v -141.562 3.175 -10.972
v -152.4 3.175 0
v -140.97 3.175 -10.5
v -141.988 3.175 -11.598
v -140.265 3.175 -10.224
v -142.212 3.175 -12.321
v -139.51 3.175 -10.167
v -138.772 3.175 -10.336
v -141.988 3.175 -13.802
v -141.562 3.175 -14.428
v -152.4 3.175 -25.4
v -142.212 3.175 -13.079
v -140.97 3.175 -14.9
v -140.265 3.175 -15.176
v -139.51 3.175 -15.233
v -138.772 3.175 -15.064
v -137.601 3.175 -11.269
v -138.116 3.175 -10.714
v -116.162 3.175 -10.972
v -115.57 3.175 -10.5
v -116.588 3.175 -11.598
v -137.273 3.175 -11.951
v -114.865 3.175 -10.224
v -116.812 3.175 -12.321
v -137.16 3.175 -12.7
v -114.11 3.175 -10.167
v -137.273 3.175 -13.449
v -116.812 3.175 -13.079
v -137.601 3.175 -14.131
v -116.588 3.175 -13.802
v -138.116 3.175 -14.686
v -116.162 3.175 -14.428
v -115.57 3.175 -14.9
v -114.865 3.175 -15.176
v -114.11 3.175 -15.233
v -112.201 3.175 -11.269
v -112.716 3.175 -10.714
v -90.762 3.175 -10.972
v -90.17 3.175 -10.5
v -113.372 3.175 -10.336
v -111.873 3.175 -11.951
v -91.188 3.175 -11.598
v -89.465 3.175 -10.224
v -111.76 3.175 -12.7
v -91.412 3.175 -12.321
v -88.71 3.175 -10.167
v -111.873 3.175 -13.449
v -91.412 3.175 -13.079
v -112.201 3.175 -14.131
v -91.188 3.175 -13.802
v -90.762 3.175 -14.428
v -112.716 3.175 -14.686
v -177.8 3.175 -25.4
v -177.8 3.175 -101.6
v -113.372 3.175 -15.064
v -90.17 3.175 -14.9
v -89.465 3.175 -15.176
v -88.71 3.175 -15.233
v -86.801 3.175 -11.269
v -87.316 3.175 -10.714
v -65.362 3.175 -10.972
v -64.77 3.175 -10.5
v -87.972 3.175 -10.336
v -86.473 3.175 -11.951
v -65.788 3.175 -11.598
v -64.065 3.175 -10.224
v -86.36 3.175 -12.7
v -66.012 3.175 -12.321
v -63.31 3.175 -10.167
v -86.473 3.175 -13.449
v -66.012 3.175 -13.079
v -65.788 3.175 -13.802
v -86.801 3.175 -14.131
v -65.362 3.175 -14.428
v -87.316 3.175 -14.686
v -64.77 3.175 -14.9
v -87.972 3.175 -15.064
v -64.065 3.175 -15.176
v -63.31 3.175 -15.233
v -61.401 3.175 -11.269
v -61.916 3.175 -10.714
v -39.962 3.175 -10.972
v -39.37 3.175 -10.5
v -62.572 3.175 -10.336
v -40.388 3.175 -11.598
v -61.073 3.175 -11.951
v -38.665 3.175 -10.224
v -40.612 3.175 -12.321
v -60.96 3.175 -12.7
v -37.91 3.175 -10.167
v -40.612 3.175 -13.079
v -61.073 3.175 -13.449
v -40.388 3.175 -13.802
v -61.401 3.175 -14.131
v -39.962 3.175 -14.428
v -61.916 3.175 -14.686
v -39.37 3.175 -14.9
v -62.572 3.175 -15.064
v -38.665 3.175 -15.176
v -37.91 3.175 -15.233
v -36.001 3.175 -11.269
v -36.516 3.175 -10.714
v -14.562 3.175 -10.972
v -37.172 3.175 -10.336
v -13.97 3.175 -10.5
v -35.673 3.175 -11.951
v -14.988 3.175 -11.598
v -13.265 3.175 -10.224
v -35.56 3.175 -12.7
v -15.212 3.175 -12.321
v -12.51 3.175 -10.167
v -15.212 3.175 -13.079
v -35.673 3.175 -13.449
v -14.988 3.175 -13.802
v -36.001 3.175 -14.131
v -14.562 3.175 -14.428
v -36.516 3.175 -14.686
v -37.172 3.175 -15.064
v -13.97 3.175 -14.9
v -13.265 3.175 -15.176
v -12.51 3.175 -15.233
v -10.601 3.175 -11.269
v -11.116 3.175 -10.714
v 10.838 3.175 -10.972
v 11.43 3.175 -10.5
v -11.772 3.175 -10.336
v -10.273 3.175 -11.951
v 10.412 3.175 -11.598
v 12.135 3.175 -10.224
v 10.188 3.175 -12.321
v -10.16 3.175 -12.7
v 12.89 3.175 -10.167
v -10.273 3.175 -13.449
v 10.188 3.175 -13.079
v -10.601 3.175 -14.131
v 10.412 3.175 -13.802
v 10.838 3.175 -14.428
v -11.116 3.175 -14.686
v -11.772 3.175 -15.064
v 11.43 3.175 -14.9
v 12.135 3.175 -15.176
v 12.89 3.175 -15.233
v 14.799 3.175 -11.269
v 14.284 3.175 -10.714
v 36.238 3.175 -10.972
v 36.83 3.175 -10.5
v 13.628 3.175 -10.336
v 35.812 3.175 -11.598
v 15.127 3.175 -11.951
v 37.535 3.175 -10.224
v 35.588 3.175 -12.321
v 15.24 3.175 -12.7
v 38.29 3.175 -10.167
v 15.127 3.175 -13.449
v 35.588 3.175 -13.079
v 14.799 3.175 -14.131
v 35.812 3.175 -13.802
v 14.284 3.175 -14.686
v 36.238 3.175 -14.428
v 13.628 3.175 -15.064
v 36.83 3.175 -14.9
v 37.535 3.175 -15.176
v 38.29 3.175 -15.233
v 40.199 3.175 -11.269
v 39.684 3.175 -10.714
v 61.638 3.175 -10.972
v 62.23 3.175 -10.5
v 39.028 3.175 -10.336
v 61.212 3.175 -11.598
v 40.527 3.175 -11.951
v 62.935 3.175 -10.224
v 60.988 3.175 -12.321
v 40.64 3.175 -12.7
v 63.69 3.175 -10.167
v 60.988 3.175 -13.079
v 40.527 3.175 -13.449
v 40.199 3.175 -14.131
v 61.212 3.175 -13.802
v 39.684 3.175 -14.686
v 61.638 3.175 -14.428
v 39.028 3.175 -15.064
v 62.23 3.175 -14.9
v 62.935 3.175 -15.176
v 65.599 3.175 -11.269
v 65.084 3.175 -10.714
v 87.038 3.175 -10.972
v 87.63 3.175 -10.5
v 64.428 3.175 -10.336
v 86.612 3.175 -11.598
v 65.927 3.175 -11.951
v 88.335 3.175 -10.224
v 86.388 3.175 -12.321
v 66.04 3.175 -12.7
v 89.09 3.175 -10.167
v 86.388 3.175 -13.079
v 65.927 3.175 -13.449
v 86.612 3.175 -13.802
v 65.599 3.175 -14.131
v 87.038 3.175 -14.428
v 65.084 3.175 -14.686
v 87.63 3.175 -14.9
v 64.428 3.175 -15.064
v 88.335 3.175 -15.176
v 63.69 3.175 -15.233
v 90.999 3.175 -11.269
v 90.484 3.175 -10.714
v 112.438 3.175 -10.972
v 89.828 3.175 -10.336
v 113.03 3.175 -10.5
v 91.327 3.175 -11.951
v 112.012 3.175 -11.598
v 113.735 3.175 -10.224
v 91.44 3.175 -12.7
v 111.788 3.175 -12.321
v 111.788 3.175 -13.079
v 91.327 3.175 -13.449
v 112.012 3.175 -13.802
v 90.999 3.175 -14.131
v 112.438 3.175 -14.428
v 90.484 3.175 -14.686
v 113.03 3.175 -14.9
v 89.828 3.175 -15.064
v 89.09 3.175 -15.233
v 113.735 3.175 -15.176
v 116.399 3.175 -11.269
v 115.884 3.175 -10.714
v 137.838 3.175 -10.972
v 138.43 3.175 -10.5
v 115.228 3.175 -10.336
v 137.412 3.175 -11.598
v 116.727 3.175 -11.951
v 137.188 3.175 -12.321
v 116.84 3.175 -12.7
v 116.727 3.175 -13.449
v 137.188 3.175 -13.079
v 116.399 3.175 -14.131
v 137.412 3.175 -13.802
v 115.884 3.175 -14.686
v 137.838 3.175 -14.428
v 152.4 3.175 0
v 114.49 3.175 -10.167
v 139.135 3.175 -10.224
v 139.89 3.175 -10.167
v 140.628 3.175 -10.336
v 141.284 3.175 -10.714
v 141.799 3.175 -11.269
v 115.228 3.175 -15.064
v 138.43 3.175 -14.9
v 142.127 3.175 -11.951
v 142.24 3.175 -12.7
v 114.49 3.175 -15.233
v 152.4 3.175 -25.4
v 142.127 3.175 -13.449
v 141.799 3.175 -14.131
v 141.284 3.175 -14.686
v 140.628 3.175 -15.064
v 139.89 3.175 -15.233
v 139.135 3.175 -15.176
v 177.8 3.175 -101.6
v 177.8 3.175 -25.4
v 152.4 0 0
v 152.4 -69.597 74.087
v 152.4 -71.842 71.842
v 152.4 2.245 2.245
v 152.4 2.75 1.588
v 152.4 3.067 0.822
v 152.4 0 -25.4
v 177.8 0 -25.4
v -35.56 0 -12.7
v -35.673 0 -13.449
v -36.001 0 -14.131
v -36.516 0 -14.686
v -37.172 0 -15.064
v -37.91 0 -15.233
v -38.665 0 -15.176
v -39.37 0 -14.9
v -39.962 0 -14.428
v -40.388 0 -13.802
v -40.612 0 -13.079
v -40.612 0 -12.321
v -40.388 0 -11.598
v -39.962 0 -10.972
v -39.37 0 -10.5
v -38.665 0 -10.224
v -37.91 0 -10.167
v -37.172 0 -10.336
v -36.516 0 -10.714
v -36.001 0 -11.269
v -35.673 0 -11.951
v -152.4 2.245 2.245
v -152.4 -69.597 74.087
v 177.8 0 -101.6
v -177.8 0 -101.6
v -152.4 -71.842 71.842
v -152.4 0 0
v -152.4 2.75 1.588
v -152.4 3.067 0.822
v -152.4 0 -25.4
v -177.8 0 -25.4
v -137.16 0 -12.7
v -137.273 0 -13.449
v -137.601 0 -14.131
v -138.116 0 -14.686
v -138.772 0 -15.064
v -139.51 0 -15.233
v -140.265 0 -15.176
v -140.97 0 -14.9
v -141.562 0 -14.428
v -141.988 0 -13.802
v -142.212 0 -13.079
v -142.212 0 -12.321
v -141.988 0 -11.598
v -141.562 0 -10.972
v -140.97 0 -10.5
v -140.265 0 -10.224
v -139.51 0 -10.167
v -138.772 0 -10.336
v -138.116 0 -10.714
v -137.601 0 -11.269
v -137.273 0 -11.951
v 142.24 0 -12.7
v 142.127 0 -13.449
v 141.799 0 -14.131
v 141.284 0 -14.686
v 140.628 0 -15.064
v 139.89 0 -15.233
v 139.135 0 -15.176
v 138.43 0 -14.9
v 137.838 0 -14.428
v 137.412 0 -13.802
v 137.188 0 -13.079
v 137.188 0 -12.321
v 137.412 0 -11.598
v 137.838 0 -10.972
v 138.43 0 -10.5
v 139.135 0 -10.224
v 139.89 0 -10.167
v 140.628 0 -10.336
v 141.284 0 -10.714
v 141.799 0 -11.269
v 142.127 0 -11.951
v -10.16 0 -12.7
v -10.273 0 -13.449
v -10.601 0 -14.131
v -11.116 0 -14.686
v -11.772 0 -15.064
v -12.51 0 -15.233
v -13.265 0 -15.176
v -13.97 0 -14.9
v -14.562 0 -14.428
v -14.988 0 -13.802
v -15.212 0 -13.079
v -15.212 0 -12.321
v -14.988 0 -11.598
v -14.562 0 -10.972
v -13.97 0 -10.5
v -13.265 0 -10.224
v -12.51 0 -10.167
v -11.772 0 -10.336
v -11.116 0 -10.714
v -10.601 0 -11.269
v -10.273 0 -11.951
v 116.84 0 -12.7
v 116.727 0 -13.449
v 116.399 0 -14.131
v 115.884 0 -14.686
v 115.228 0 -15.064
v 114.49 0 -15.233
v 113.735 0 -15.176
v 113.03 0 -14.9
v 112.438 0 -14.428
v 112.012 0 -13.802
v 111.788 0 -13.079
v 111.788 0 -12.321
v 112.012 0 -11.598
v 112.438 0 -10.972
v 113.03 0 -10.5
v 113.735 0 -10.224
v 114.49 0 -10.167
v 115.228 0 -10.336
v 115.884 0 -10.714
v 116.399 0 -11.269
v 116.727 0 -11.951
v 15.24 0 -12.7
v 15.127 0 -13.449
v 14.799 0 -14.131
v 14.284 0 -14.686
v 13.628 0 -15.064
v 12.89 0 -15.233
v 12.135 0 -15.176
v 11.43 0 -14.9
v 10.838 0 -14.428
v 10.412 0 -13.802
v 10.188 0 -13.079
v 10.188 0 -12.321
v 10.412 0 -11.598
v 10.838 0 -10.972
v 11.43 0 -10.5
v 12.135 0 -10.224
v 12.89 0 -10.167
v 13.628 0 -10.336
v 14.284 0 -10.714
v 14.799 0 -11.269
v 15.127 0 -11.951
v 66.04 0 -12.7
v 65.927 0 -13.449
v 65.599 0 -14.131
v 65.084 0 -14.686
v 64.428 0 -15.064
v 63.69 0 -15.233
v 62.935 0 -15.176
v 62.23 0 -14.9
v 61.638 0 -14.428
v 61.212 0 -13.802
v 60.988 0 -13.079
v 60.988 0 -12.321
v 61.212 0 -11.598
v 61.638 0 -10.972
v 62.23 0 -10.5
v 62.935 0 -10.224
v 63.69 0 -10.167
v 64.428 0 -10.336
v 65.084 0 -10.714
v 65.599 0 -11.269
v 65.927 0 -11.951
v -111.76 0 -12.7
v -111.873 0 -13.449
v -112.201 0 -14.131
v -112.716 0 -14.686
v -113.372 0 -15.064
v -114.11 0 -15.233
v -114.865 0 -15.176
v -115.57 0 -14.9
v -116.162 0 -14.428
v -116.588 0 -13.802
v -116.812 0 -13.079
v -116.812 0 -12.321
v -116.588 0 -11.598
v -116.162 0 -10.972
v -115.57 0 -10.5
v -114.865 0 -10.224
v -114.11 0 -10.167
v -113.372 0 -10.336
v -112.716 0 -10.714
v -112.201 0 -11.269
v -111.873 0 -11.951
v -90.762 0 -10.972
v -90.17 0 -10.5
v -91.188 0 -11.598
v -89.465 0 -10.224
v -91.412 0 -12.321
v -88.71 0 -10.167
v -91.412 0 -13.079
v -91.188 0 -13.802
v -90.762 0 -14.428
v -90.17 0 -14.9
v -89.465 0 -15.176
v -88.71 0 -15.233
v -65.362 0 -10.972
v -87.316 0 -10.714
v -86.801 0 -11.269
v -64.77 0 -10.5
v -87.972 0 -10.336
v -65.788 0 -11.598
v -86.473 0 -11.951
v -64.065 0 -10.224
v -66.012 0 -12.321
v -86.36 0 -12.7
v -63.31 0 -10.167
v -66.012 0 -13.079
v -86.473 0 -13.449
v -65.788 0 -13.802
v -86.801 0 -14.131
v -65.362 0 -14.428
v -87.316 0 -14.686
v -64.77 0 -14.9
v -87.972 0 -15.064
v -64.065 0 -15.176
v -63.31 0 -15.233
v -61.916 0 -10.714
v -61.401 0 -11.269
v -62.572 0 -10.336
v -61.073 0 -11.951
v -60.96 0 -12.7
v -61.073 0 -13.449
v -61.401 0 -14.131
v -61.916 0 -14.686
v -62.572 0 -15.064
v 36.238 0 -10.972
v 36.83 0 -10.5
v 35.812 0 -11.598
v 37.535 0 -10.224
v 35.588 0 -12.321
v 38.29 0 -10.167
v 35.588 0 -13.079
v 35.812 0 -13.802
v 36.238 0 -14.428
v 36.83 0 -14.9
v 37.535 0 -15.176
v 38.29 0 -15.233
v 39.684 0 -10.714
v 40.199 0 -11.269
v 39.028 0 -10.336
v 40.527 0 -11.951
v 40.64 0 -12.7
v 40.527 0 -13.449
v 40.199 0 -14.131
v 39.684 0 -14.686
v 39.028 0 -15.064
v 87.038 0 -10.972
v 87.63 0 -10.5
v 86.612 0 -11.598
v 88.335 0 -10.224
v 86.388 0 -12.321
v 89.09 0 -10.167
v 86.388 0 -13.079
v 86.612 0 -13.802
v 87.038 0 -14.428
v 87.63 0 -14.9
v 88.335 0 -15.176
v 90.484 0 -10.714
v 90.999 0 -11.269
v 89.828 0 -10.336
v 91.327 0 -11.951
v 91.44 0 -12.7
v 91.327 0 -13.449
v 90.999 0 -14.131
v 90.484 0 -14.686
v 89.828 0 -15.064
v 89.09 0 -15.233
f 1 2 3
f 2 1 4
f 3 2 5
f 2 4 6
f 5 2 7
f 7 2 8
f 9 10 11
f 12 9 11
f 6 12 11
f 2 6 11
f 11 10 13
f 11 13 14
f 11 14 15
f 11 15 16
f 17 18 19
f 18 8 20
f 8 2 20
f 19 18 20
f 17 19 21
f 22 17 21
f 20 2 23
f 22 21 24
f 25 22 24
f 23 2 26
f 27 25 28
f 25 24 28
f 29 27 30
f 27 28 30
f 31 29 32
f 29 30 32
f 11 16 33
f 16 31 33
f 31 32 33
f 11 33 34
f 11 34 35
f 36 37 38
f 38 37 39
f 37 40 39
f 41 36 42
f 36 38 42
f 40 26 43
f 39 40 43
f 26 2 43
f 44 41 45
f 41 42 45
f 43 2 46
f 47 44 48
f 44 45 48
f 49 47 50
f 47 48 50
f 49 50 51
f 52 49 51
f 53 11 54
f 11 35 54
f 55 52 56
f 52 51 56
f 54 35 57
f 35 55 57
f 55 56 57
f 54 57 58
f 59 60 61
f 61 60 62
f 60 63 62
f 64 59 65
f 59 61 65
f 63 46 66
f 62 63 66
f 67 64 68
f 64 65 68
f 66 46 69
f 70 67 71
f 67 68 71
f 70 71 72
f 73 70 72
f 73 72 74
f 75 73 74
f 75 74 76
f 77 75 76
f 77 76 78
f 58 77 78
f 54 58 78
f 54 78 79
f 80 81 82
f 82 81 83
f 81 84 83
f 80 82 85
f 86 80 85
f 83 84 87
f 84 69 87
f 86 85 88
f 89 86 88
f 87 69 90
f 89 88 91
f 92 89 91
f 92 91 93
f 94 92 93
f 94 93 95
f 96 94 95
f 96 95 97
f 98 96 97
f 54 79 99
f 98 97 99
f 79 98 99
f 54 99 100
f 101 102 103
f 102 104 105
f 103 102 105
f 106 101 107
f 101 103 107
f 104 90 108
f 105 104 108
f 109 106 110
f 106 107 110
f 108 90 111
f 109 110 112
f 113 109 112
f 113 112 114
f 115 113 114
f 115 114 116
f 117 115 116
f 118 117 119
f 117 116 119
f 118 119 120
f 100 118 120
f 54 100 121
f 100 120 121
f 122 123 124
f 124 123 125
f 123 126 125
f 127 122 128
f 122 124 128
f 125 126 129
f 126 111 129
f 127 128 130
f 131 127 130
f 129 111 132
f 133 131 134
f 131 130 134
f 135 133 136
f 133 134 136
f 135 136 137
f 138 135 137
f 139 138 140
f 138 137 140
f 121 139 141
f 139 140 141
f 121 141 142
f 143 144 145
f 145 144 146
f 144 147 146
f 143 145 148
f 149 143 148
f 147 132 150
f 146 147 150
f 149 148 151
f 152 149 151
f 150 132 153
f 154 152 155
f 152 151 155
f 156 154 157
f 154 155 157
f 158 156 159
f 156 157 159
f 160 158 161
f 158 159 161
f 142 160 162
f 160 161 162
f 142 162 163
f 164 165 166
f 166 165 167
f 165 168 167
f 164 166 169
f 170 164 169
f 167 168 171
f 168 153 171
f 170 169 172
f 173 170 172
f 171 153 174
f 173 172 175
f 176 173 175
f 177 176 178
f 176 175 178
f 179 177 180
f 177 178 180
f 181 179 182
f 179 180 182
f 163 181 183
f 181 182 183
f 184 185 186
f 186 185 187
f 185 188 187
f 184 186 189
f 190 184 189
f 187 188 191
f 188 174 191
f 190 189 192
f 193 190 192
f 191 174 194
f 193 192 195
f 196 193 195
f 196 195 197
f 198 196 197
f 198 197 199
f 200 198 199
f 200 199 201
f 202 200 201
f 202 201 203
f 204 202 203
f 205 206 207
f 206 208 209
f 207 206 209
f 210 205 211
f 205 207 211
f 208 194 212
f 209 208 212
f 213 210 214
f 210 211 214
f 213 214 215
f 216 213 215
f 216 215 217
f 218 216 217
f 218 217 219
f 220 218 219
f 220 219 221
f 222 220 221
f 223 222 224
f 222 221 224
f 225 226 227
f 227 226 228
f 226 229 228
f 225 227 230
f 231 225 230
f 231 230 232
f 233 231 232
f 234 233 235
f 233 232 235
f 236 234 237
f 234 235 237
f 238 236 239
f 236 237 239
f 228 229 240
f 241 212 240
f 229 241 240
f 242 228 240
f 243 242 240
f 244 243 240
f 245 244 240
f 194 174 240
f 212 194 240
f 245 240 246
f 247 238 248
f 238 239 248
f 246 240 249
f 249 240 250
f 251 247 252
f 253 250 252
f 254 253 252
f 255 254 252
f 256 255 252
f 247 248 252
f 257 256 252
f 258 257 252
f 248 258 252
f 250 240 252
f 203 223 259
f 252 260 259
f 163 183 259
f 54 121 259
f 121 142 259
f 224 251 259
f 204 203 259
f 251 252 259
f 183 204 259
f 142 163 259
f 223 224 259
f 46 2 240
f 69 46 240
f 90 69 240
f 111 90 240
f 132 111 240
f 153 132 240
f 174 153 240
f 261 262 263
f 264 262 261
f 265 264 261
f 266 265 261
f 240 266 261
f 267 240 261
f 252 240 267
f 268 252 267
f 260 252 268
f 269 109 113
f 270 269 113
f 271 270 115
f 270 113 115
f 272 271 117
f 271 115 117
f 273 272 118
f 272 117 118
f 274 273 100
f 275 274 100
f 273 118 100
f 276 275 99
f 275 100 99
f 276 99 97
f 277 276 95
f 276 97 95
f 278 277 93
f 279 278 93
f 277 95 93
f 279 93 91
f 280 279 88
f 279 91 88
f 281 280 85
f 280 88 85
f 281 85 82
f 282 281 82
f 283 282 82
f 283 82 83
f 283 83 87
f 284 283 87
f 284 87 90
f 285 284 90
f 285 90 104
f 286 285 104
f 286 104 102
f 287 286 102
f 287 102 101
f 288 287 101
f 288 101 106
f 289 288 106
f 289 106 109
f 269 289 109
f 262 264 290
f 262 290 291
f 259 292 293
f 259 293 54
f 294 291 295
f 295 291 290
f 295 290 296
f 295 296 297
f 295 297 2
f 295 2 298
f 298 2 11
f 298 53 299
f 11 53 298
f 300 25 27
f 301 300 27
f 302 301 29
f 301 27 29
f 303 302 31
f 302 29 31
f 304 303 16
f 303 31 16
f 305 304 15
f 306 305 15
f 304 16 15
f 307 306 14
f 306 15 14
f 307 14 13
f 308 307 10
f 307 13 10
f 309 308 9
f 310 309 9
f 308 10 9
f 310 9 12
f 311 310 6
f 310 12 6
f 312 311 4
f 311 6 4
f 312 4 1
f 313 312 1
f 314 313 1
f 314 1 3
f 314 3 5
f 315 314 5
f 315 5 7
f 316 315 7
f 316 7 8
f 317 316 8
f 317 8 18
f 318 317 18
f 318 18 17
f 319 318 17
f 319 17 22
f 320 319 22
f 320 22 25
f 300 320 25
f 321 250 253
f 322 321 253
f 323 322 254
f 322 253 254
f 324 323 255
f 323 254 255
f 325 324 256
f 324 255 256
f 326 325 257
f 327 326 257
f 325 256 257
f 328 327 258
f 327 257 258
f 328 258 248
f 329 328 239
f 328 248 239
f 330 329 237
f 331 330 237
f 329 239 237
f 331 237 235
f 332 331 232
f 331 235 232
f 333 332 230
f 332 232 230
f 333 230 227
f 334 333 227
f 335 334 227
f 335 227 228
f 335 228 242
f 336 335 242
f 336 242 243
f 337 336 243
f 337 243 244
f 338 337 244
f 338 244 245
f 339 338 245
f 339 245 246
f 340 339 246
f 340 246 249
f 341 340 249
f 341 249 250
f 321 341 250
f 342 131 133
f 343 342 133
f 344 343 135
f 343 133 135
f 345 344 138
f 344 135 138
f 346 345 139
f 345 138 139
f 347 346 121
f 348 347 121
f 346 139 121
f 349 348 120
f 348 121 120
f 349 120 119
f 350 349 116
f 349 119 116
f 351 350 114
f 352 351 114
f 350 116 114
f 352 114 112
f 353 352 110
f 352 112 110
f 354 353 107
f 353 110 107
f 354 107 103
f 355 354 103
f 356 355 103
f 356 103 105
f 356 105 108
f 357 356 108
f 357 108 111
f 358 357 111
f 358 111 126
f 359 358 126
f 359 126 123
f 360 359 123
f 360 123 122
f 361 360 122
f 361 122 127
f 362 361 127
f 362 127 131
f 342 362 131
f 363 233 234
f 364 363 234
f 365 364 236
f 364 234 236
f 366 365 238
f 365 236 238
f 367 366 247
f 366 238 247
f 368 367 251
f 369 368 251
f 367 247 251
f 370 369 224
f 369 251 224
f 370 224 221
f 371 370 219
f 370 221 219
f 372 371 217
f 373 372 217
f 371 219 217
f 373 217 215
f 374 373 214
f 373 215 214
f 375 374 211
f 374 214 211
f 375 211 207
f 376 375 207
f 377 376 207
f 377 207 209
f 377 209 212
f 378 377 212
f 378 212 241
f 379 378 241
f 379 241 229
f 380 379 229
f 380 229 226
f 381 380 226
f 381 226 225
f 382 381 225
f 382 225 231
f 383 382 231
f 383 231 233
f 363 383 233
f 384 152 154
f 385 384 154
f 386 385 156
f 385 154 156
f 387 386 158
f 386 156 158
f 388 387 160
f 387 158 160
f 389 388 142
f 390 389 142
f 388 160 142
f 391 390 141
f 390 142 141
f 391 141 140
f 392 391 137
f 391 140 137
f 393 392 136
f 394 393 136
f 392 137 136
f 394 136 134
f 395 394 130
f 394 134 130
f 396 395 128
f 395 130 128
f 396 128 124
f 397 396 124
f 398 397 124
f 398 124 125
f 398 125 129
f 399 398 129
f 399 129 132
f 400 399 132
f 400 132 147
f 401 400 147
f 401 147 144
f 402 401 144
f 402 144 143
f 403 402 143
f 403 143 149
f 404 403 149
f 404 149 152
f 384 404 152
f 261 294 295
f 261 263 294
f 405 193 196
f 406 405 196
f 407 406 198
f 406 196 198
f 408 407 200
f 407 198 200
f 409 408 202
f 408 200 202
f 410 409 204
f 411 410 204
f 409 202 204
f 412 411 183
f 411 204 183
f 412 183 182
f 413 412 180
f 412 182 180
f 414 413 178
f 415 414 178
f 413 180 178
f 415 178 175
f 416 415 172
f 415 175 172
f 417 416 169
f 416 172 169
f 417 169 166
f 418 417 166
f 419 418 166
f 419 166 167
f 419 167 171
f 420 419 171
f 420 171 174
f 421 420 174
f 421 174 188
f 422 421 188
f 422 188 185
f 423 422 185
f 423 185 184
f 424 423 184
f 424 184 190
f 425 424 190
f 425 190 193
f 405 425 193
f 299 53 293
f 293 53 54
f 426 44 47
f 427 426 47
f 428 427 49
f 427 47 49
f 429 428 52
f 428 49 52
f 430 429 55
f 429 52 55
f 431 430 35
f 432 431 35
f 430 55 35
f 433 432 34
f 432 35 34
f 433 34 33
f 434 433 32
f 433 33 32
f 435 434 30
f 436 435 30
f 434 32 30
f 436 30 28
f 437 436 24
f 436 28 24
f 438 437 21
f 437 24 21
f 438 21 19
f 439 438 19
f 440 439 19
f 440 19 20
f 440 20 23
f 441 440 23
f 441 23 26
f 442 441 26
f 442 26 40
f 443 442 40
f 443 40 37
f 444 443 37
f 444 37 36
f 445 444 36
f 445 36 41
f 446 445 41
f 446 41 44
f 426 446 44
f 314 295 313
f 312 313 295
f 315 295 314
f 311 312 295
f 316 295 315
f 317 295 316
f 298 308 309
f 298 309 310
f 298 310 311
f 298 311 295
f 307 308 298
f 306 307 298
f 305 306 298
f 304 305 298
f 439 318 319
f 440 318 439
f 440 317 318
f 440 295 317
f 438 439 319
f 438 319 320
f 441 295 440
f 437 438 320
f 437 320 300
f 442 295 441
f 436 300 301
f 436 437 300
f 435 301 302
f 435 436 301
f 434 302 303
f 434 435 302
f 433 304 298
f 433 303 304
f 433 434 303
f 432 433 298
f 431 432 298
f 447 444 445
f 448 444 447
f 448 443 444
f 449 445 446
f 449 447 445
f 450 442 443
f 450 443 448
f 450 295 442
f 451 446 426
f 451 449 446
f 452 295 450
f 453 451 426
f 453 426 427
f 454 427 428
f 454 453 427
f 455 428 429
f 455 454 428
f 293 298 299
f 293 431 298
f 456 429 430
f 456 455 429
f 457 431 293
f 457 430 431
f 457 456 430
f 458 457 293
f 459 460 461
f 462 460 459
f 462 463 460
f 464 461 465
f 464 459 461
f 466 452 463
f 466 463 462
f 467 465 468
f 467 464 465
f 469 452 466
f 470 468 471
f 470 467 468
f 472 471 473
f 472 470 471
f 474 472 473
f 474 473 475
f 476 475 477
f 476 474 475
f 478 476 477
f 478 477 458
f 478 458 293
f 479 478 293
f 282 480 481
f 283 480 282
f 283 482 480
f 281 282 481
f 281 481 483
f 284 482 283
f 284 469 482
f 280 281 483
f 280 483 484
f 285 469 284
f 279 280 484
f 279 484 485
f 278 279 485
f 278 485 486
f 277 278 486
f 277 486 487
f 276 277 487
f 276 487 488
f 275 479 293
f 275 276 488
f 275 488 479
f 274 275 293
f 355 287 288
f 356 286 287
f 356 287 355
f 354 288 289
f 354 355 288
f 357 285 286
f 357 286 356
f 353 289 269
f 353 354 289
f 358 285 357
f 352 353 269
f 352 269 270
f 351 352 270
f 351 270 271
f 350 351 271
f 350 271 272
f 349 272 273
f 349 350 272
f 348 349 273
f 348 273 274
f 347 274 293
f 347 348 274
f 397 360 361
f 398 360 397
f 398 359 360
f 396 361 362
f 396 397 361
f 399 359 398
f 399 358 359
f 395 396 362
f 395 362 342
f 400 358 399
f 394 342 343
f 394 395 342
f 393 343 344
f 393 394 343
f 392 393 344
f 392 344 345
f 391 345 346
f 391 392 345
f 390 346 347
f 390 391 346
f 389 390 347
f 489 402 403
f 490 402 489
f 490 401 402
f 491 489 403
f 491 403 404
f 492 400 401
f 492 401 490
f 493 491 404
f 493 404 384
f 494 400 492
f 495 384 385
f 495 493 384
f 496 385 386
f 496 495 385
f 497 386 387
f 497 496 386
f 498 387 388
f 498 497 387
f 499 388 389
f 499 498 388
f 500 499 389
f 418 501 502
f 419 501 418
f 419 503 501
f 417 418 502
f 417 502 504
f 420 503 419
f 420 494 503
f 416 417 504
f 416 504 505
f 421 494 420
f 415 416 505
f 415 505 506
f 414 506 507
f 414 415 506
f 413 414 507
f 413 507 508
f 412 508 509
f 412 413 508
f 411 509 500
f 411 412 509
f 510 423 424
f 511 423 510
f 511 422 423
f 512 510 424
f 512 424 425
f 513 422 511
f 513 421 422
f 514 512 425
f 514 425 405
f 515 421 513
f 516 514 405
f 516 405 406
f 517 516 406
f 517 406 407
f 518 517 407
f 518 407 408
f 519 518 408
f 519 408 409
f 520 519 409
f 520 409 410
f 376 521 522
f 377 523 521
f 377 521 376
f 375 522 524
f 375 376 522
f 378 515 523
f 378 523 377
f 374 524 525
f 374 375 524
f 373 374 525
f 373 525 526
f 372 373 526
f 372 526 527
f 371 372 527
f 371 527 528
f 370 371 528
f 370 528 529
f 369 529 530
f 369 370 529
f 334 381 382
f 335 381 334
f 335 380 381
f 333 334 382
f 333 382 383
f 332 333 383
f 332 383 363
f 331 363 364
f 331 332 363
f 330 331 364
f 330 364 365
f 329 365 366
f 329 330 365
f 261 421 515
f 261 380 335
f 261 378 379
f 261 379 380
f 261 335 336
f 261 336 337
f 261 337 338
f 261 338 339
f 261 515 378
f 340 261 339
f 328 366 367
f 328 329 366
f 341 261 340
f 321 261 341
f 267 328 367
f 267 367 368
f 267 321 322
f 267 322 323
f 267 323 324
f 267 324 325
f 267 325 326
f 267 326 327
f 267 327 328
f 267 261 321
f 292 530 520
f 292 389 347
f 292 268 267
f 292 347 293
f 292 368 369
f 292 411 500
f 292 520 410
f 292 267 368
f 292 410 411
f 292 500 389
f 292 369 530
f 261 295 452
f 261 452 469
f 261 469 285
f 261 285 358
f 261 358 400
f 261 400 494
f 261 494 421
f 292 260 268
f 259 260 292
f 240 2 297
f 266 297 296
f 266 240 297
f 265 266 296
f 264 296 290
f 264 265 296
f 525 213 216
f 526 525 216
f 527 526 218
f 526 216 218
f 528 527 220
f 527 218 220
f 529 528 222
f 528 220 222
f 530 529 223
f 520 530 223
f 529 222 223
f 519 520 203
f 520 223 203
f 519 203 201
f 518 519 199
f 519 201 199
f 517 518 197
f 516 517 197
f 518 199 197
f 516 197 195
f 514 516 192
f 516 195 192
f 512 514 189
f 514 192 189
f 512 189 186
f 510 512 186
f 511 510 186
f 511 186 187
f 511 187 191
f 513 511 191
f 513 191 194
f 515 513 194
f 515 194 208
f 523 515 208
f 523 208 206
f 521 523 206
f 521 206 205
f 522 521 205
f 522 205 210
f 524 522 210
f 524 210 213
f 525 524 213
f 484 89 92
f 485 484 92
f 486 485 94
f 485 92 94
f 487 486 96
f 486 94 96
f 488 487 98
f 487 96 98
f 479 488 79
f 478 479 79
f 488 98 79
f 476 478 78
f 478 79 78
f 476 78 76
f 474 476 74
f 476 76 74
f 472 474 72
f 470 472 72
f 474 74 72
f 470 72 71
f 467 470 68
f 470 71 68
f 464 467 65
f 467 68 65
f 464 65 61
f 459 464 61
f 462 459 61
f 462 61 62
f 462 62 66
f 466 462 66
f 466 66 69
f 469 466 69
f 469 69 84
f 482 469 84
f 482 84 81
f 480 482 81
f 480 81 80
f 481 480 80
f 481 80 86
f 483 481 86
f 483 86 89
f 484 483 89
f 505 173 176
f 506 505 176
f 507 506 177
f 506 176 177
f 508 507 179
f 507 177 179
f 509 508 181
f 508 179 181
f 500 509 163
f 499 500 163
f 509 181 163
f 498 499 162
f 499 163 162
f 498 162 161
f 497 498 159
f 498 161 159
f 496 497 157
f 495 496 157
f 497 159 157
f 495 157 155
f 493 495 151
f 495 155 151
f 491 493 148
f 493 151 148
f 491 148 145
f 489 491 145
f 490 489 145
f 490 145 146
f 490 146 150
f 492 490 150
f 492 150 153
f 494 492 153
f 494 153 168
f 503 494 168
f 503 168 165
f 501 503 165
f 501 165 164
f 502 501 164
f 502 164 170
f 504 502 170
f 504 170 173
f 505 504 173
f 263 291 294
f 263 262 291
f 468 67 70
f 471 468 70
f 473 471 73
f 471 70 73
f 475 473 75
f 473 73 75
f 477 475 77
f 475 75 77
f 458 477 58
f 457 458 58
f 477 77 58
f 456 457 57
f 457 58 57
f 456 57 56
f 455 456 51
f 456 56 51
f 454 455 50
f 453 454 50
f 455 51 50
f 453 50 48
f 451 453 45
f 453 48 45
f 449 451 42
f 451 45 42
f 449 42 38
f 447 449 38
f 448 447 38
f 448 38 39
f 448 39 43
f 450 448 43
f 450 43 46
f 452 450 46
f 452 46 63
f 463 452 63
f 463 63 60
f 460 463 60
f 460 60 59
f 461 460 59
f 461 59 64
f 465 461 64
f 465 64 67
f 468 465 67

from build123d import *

# Parameters (mm, degrees)
INITIAL_MIDPLANE_EXTRUDE_DEPTH = 152.4
SKETCH1_3_W                    = 101.6
SKETCH1_3_H                    = 3.175
REEXTRUDE_FOR_WINGS_DEPTH      = 177.8
SKETCH2_W                      = 25.4
SKETCH2_H                      = 25.4
BANDSAW_CUT_DEPTH              = 219.089334072
SKETCH3_R                      = 2.54
INITIAL_MOUNTING_HOLE_DEPTH    = 219.089334072
MOUNTING_HOLE_PATTERN_COUNT    = 12
MOUNTING_HOLE_PATTERN_PITCH    = 25.4


with BuildPart() as part:
    # Sketch1 → Initial MidPlane Extrude (new, symmetric)
    with BuildSketch(Plane(origin=(0, 0, 0), x_dir=(0, 0, -1), z_dir=(1, 0, 0))):
        with BuildLine():
            ThreePointArc((0, 3.175), (-1.215019898, 2.933317516), (-2.24506403, 2.24506403))
            Line((-2.24506403, 2.24506403), (-74.087112999, -69.596984938))
            Line((-74.087112999, -69.596984938), (-71.842048969, -71.842048969))
            Line((-71.842048969, -71.842048969), (0, 0))
            Line((0, 0), (101.6, 0))
            Line((101.6, 0), (101.6, 3.175))
            Line((101.6, 3.175), (0, 3.175))
        make_face()
    extrude(amount=INITIAL_MIDPLANE_EXTRUDE_DEPTH, both=True)

    # Sketch1<3> → ReExtrude For Wings. (add, symmetric)
    with BuildSketch(Plane(origin=(0, 0, 0), x_dir=(0, 0, -1), z_dir=(1, 0, 0))):
        with Locations((50.8, 1.5875)):
            Rectangle(SKETCH1_3_W, SKETCH1_3_H)
    extrude(amount=REEXTRUDE_FOR_WINGS_DEPTH, both=True)

    # Sketch2 → Bandsaw Cut (cut, through all)
    with BuildSketch(Plane(origin=(0, 3.175, 0), x_dir=(1, 0, 0), z_dir=(0, 1, 0))):
        with Locations((-165.1, 12.7)):
            Rectangle(SKETCH2_W, SKETCH2_H)
        with Locations((165.1, 12.7)):
            Rectangle(SKETCH2_W, SKETCH2_H)
    extrude(amount=-BANDSAW_CUT_DEPTH, mode=Mode.SUBTRACT)

    # Sketch3 → Initial Mounting Hole (cut, through all)
    with BuildSketch(Plane(origin=(0, 3.175, 0), x_dir=(1, 0, 0), z_dir=(0, 1, 0))):
        with Locations((-139.7, 12.7)):
            Circle(SKETCH3_R)
    initial_mounting_hole = extrude(amount=-INITIAL_MOUNTING_HOLE_DEPTH, mode=Mode.SUBTRACT)

    # Mounting Hole Pattern: Initial Mounting Hole ×12
    with Locations(*[(i * MOUNTING_HOLE_PATTERN_PITCH, 0, 0) for i in range(1, MOUNTING_HOLE_PATTERN_COUNT)]):
        add(initial_mounting_hole, mode=Mode.SUBTRACT)


solid = part.part
